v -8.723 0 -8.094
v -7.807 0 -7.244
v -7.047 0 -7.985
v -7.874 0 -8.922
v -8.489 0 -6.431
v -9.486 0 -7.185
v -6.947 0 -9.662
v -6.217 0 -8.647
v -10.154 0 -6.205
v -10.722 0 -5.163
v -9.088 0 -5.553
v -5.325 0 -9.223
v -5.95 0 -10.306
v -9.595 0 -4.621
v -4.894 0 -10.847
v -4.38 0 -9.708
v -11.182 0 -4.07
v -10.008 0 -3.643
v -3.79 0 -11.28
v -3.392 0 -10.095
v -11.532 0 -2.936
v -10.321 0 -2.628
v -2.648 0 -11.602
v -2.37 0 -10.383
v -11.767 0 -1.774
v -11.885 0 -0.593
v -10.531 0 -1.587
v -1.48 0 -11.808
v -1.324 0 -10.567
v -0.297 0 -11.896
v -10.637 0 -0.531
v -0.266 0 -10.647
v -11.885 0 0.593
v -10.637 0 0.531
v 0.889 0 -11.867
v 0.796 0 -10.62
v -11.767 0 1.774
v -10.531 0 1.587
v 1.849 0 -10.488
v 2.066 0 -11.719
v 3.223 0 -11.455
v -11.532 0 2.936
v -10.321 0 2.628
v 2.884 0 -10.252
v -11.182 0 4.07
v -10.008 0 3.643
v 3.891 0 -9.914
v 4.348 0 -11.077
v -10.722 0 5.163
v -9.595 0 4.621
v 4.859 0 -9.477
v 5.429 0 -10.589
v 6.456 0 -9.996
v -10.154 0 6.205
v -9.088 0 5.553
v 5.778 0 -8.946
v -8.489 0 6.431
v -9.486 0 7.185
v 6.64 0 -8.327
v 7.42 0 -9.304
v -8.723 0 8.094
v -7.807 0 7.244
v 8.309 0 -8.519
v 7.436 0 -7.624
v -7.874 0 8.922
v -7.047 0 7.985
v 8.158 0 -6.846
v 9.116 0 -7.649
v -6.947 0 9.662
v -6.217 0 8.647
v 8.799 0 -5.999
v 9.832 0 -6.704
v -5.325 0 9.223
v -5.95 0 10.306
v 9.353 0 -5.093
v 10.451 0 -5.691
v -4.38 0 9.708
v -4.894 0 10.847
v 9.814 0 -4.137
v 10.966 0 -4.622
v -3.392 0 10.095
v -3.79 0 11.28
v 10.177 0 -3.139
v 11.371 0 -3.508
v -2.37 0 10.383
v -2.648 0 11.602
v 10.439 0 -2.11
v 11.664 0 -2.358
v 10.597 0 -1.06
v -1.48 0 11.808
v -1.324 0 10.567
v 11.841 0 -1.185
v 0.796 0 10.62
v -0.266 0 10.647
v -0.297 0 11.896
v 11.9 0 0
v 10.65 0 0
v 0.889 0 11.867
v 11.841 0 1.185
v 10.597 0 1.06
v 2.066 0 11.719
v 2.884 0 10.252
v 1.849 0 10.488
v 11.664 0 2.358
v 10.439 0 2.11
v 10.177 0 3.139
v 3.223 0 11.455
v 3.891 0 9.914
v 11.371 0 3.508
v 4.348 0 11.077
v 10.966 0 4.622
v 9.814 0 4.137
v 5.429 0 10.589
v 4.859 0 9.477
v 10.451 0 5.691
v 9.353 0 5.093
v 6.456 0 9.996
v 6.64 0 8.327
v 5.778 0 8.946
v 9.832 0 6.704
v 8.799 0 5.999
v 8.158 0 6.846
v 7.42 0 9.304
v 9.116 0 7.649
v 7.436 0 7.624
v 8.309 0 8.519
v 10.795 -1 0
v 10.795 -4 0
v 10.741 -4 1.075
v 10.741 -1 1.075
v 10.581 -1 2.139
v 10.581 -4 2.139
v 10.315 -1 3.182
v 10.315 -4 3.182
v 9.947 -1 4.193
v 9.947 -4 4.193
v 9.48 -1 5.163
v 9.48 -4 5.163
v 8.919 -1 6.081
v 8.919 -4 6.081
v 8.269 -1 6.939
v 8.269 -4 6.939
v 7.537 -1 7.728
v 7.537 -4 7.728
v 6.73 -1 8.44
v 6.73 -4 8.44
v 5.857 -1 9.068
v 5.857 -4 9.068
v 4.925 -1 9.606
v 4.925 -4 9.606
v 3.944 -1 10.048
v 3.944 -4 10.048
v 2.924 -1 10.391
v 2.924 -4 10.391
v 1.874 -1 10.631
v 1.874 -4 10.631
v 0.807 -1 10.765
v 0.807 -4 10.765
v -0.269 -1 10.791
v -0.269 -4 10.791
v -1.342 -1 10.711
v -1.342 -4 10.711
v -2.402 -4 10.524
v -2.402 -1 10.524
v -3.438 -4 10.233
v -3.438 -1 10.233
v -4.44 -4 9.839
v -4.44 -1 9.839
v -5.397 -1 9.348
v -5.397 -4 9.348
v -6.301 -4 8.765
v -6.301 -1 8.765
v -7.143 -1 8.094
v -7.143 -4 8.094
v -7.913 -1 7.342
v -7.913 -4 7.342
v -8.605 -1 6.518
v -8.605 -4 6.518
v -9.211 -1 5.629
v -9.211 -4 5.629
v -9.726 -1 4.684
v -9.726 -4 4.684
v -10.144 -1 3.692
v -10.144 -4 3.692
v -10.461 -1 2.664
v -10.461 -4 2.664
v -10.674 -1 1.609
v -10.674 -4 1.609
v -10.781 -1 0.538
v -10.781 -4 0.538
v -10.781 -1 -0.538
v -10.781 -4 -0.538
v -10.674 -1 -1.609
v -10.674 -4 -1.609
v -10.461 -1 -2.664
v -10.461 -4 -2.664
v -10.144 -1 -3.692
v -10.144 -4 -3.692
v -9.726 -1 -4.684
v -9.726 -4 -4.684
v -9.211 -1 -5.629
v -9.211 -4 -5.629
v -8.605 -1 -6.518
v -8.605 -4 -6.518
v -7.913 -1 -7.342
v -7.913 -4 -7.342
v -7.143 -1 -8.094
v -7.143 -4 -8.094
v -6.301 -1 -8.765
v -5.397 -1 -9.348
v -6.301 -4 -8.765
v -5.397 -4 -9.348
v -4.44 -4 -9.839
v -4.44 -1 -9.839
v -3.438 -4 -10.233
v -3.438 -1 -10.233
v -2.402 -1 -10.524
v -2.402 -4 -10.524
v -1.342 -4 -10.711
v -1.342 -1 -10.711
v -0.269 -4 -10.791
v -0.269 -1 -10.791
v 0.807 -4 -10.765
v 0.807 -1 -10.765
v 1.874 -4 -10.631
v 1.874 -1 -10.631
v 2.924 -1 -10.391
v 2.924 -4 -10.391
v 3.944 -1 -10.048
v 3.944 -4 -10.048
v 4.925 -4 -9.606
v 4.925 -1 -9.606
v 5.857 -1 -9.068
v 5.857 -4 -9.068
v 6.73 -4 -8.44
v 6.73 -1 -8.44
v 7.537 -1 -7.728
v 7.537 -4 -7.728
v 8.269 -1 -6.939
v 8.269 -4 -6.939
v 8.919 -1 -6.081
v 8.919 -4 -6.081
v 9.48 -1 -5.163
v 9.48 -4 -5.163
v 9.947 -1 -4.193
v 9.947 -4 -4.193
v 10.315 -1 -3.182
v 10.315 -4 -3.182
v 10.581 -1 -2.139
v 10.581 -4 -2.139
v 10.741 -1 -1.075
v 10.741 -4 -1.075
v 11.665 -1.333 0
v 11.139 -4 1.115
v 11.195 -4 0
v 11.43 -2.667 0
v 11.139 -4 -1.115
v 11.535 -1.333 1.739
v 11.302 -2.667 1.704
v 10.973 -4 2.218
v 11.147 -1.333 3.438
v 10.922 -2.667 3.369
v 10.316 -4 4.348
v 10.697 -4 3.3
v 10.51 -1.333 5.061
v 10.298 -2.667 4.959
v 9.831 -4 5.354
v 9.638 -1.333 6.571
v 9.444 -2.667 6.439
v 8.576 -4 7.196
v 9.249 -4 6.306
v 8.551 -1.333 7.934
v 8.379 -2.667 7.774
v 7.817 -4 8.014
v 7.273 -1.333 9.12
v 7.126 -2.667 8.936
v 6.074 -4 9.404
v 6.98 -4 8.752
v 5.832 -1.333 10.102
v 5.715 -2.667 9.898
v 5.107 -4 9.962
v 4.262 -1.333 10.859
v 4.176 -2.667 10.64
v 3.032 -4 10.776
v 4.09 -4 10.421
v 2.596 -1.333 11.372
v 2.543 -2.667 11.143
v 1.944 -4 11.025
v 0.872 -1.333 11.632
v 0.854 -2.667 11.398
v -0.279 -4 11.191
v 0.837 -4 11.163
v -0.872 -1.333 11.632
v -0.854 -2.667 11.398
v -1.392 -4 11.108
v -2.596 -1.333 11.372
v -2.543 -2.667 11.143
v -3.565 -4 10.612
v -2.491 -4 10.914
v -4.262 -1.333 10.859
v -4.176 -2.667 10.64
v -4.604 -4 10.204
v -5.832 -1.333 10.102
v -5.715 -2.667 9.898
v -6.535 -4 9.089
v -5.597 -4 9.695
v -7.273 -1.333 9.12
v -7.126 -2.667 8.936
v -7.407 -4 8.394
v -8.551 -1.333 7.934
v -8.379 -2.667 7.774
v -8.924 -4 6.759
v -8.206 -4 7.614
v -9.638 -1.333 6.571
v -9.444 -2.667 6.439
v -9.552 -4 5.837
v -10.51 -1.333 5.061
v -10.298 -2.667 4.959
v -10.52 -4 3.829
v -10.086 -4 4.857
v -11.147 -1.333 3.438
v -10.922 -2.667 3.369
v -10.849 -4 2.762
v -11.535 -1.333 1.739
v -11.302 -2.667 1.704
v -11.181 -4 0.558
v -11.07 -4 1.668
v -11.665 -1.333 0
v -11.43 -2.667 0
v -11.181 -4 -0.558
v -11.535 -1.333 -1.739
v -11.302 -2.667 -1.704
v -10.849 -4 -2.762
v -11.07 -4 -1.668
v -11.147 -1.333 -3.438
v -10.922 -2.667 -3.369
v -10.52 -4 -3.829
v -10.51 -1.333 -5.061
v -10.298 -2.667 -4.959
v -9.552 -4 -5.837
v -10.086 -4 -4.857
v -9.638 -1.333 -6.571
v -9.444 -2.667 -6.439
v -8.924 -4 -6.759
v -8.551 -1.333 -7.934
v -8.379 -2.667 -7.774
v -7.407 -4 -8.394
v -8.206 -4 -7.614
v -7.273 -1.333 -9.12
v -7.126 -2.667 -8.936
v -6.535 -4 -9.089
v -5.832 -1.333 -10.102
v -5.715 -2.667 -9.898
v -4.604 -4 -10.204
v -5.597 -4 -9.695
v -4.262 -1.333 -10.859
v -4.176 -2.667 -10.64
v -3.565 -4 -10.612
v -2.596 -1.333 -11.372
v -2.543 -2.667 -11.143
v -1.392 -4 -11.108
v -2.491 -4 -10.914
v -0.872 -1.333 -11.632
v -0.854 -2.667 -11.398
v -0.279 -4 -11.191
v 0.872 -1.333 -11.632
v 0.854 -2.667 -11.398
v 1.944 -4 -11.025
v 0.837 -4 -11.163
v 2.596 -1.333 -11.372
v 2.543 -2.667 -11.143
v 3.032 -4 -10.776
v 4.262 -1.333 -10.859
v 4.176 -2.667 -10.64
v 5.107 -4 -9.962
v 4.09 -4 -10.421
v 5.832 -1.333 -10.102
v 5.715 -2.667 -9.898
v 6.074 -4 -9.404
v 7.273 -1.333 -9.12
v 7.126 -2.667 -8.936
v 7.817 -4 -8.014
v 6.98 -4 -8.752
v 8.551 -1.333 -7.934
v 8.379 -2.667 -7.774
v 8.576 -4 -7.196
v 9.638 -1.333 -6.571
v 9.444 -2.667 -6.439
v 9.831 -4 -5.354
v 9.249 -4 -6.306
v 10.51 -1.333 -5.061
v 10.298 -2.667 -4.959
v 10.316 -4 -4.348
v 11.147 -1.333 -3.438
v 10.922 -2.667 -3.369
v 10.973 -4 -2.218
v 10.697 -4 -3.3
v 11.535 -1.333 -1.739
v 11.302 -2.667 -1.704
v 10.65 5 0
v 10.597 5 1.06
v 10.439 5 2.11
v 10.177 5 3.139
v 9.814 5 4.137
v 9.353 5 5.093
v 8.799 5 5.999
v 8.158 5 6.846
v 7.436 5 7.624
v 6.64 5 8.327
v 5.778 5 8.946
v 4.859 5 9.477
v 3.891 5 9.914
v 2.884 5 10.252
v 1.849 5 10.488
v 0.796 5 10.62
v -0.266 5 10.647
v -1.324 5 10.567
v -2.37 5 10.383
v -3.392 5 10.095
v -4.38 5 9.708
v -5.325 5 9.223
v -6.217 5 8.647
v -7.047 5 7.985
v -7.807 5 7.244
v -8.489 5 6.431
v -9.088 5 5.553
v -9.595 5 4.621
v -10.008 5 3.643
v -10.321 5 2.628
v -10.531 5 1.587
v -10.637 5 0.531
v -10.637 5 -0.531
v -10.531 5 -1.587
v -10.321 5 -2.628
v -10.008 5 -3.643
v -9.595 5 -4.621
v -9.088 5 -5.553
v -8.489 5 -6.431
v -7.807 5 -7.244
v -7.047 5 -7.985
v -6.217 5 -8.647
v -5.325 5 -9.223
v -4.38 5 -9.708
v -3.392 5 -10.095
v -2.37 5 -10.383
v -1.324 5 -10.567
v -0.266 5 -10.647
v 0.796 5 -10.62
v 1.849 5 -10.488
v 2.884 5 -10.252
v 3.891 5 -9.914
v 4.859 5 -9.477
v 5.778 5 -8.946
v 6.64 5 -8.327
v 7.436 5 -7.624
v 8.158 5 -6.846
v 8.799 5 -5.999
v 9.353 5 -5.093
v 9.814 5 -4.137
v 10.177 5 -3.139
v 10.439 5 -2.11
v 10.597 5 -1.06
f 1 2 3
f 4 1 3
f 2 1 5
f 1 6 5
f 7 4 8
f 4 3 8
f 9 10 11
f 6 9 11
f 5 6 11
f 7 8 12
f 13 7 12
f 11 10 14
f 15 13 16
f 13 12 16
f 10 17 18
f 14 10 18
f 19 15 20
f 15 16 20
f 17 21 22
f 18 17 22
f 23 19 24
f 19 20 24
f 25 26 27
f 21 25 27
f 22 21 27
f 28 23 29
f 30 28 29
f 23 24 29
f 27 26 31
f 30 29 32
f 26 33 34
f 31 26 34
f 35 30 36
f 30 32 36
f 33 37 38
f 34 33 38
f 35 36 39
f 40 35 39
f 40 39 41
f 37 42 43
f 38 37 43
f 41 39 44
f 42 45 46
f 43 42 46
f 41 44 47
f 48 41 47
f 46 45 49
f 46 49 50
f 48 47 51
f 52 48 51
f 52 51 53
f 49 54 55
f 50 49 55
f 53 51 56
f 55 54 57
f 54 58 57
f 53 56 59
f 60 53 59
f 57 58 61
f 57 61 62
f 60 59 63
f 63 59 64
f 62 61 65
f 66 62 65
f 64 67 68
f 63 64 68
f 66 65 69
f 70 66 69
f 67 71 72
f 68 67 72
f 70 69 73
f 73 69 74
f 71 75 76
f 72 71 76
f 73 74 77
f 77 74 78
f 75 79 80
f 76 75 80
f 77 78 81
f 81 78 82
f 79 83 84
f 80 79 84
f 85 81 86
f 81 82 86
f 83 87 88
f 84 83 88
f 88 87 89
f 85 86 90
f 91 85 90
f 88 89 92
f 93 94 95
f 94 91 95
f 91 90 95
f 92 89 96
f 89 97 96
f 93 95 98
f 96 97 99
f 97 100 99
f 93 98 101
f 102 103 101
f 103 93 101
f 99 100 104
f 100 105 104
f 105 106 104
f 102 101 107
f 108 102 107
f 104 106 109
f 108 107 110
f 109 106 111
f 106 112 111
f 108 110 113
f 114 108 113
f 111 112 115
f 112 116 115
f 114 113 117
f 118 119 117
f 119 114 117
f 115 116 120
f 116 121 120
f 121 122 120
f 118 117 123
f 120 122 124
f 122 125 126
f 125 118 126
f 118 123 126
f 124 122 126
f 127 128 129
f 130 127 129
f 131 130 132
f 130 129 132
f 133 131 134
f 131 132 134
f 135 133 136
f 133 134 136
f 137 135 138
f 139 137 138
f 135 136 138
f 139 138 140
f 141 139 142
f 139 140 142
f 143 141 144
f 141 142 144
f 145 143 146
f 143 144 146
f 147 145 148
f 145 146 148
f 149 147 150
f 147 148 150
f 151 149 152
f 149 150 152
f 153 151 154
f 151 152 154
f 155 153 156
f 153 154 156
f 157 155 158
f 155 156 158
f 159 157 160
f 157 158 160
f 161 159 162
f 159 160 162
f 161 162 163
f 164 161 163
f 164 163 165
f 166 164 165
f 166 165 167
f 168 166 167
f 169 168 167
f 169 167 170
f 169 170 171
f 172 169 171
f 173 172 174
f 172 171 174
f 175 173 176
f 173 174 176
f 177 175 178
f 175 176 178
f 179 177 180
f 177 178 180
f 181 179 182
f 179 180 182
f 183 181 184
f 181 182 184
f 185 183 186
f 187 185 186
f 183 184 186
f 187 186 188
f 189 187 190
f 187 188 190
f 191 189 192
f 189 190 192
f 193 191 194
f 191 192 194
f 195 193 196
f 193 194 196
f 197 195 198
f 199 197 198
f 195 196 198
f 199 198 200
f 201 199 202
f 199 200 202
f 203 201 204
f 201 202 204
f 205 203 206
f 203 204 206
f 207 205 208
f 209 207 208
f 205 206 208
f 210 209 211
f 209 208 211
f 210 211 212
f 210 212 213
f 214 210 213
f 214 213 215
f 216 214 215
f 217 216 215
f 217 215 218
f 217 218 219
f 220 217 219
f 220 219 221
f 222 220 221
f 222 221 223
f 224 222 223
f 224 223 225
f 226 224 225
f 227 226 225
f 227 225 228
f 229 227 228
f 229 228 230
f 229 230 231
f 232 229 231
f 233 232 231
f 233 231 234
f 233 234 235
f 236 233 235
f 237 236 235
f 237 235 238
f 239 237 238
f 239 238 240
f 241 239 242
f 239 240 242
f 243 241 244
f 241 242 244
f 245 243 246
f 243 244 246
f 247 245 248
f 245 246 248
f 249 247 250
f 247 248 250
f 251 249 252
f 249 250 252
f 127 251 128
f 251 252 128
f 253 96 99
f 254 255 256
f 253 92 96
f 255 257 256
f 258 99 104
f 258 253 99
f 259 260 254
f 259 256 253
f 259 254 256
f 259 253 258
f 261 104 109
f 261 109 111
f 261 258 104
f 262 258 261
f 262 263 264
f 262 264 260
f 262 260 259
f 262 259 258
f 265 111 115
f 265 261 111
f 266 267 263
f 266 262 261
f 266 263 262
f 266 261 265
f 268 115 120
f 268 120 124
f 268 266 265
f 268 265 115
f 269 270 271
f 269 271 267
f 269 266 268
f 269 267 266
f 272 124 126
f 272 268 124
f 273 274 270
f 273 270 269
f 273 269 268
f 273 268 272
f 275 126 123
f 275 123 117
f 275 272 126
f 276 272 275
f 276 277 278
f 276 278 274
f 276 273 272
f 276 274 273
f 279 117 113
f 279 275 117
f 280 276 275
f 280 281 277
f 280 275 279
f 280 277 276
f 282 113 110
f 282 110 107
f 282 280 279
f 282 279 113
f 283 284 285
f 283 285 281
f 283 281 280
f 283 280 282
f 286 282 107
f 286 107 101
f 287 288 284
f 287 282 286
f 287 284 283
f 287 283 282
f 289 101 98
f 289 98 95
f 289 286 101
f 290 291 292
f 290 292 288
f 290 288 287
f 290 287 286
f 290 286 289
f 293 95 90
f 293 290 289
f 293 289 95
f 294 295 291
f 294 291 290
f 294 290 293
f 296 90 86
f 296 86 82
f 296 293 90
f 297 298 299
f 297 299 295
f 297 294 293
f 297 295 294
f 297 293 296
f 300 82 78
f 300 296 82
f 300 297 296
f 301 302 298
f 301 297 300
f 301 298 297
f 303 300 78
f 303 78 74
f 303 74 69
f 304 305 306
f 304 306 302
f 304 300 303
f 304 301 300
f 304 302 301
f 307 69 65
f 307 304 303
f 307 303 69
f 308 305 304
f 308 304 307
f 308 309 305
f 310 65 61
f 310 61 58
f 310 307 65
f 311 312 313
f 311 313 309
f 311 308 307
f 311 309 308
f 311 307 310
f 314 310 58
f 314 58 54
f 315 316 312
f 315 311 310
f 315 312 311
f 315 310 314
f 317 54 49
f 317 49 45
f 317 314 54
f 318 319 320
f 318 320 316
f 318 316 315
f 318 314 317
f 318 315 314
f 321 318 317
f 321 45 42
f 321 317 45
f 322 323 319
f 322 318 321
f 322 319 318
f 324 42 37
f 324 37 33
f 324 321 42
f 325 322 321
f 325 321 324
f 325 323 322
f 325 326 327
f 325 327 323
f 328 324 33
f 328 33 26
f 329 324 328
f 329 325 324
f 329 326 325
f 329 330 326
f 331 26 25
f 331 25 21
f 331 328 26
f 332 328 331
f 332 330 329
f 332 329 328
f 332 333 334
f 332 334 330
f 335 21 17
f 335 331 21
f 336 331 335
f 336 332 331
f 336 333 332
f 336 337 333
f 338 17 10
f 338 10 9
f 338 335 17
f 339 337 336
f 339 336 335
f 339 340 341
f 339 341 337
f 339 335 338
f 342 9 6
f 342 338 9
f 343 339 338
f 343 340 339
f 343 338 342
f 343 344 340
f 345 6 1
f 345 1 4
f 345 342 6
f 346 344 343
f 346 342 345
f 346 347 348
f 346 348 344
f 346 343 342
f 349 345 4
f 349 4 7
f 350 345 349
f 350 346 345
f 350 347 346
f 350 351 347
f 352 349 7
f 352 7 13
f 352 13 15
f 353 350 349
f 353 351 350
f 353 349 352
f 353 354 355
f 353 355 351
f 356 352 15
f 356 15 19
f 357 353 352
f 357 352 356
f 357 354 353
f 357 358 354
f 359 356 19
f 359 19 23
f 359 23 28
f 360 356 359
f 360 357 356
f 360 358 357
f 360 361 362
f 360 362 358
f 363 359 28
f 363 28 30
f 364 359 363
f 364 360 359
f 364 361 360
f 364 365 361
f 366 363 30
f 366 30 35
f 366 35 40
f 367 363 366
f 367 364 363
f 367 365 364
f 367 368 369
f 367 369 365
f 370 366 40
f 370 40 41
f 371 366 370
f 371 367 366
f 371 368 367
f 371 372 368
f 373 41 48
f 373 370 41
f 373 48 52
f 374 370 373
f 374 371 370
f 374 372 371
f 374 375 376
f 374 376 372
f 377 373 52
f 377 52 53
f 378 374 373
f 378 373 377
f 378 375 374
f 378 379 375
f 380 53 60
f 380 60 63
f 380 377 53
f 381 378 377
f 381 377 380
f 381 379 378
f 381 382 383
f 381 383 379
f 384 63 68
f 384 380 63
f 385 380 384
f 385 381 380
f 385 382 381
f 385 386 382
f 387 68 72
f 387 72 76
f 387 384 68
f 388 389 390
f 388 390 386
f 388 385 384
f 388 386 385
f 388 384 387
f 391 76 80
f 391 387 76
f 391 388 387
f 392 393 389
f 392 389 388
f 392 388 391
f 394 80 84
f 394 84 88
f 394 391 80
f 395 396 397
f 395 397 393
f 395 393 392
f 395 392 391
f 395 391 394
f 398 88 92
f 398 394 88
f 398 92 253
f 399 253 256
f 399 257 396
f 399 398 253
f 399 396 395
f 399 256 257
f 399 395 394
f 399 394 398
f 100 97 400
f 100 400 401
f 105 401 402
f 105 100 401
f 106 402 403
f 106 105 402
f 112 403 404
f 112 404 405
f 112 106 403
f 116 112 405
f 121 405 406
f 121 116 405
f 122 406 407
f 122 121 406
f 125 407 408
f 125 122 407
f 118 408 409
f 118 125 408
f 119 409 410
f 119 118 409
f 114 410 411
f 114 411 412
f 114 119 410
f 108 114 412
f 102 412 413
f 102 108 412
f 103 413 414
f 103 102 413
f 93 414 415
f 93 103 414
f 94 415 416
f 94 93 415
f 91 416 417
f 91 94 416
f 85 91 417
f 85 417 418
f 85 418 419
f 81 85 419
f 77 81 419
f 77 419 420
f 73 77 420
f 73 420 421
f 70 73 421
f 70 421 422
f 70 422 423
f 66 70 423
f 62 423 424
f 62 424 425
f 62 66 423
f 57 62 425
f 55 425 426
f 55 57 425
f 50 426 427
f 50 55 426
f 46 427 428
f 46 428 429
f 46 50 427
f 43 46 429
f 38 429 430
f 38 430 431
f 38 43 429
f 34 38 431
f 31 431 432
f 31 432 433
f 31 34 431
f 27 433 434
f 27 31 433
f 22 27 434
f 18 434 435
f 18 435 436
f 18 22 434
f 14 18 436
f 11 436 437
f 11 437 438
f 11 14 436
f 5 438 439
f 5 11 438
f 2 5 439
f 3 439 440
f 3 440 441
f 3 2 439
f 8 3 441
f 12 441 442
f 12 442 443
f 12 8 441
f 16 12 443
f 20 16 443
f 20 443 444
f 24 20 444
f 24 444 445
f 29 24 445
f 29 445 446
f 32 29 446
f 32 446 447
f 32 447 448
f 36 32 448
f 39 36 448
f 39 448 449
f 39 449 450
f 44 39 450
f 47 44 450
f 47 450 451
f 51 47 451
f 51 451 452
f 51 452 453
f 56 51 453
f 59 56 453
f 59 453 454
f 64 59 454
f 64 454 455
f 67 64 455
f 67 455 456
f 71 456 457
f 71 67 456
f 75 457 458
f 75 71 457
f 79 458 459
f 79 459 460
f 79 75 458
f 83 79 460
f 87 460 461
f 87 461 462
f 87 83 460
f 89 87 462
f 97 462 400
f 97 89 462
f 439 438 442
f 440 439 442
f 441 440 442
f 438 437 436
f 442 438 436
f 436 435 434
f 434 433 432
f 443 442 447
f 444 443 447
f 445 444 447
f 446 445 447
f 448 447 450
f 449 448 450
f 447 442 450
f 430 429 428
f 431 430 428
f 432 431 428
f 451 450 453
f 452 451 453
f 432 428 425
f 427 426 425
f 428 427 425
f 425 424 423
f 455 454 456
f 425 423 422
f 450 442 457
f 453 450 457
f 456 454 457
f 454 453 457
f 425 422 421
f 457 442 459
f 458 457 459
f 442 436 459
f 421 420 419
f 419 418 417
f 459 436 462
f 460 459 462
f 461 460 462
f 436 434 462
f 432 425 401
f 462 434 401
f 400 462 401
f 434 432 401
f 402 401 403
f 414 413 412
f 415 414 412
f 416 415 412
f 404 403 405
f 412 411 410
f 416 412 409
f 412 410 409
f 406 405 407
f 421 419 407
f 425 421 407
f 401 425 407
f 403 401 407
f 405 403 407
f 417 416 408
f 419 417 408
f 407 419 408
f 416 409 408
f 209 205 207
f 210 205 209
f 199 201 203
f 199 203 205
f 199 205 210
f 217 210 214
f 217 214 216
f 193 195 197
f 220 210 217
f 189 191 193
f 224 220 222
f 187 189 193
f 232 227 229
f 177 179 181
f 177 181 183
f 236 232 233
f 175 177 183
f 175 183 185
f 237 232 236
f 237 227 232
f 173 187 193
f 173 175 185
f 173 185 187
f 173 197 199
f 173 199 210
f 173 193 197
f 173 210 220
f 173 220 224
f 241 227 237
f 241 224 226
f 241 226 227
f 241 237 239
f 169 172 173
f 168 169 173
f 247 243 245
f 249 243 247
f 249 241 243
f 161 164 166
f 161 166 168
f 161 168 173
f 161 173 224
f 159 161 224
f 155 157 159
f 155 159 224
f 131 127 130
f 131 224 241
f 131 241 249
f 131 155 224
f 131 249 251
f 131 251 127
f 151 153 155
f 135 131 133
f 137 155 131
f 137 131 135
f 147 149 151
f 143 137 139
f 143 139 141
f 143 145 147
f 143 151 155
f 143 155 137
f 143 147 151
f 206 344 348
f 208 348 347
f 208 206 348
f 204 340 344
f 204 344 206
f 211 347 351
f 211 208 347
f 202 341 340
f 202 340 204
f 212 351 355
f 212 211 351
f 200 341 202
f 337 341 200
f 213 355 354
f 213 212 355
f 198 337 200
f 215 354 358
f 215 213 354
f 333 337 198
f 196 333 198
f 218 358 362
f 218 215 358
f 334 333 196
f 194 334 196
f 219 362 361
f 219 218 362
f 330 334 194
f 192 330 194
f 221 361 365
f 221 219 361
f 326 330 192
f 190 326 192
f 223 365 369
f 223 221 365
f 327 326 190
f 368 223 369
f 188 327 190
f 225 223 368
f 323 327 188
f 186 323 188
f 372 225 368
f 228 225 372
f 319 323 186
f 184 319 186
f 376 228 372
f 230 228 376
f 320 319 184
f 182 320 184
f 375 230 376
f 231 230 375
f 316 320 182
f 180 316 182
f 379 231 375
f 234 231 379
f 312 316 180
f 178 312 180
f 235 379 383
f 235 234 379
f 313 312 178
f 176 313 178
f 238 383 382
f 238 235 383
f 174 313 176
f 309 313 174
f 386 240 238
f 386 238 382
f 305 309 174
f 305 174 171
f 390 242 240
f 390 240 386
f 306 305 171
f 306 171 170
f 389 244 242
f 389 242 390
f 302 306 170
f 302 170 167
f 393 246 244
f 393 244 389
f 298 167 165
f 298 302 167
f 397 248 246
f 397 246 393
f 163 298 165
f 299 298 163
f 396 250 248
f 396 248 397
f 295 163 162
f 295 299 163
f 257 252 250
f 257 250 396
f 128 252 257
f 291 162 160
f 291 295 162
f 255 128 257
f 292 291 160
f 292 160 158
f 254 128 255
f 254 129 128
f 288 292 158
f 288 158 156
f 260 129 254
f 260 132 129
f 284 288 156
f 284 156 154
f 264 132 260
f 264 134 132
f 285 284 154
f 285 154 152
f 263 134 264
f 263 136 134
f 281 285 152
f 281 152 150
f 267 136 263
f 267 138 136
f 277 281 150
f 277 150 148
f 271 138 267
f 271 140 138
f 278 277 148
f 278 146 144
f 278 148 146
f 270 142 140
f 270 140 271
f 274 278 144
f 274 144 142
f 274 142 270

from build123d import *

# Parameters (mm, degrees)
F0_R     = 10.65
F1_DEPTH = 5
F0_R_2   = 11.9
F2_DEPTH = 4
F2_TAPER = 10
F3_R     = 10.7946920772
F4_DEPTH = 3


with BuildPart() as f1:
    # F0 (on Front) → F1 (new body)
    with BuildSketch(Plane.XZ):
        Circle(F0_R)
    extrude(amount=-F1_DEPTH)

    # F0 (on Front) → F2 (join)
    with BuildSketch(Plane.XZ):
        Circle(F0_R_2)
        Circle(F0_R, mode=Mode.SUBTRACT)
        Circle(F0_R)
    extrude(amount=F2_DEPTH, taper=F2_TAPER)

    # F3 (on face) → F4 (cut)
    with BuildSketch(Plane.XZ.offset(4)):
        Circle(F3_R)
    extrude(amount=-F4_DEPTH, mode=Mode.SUBTRACT)


solid = f1.part
